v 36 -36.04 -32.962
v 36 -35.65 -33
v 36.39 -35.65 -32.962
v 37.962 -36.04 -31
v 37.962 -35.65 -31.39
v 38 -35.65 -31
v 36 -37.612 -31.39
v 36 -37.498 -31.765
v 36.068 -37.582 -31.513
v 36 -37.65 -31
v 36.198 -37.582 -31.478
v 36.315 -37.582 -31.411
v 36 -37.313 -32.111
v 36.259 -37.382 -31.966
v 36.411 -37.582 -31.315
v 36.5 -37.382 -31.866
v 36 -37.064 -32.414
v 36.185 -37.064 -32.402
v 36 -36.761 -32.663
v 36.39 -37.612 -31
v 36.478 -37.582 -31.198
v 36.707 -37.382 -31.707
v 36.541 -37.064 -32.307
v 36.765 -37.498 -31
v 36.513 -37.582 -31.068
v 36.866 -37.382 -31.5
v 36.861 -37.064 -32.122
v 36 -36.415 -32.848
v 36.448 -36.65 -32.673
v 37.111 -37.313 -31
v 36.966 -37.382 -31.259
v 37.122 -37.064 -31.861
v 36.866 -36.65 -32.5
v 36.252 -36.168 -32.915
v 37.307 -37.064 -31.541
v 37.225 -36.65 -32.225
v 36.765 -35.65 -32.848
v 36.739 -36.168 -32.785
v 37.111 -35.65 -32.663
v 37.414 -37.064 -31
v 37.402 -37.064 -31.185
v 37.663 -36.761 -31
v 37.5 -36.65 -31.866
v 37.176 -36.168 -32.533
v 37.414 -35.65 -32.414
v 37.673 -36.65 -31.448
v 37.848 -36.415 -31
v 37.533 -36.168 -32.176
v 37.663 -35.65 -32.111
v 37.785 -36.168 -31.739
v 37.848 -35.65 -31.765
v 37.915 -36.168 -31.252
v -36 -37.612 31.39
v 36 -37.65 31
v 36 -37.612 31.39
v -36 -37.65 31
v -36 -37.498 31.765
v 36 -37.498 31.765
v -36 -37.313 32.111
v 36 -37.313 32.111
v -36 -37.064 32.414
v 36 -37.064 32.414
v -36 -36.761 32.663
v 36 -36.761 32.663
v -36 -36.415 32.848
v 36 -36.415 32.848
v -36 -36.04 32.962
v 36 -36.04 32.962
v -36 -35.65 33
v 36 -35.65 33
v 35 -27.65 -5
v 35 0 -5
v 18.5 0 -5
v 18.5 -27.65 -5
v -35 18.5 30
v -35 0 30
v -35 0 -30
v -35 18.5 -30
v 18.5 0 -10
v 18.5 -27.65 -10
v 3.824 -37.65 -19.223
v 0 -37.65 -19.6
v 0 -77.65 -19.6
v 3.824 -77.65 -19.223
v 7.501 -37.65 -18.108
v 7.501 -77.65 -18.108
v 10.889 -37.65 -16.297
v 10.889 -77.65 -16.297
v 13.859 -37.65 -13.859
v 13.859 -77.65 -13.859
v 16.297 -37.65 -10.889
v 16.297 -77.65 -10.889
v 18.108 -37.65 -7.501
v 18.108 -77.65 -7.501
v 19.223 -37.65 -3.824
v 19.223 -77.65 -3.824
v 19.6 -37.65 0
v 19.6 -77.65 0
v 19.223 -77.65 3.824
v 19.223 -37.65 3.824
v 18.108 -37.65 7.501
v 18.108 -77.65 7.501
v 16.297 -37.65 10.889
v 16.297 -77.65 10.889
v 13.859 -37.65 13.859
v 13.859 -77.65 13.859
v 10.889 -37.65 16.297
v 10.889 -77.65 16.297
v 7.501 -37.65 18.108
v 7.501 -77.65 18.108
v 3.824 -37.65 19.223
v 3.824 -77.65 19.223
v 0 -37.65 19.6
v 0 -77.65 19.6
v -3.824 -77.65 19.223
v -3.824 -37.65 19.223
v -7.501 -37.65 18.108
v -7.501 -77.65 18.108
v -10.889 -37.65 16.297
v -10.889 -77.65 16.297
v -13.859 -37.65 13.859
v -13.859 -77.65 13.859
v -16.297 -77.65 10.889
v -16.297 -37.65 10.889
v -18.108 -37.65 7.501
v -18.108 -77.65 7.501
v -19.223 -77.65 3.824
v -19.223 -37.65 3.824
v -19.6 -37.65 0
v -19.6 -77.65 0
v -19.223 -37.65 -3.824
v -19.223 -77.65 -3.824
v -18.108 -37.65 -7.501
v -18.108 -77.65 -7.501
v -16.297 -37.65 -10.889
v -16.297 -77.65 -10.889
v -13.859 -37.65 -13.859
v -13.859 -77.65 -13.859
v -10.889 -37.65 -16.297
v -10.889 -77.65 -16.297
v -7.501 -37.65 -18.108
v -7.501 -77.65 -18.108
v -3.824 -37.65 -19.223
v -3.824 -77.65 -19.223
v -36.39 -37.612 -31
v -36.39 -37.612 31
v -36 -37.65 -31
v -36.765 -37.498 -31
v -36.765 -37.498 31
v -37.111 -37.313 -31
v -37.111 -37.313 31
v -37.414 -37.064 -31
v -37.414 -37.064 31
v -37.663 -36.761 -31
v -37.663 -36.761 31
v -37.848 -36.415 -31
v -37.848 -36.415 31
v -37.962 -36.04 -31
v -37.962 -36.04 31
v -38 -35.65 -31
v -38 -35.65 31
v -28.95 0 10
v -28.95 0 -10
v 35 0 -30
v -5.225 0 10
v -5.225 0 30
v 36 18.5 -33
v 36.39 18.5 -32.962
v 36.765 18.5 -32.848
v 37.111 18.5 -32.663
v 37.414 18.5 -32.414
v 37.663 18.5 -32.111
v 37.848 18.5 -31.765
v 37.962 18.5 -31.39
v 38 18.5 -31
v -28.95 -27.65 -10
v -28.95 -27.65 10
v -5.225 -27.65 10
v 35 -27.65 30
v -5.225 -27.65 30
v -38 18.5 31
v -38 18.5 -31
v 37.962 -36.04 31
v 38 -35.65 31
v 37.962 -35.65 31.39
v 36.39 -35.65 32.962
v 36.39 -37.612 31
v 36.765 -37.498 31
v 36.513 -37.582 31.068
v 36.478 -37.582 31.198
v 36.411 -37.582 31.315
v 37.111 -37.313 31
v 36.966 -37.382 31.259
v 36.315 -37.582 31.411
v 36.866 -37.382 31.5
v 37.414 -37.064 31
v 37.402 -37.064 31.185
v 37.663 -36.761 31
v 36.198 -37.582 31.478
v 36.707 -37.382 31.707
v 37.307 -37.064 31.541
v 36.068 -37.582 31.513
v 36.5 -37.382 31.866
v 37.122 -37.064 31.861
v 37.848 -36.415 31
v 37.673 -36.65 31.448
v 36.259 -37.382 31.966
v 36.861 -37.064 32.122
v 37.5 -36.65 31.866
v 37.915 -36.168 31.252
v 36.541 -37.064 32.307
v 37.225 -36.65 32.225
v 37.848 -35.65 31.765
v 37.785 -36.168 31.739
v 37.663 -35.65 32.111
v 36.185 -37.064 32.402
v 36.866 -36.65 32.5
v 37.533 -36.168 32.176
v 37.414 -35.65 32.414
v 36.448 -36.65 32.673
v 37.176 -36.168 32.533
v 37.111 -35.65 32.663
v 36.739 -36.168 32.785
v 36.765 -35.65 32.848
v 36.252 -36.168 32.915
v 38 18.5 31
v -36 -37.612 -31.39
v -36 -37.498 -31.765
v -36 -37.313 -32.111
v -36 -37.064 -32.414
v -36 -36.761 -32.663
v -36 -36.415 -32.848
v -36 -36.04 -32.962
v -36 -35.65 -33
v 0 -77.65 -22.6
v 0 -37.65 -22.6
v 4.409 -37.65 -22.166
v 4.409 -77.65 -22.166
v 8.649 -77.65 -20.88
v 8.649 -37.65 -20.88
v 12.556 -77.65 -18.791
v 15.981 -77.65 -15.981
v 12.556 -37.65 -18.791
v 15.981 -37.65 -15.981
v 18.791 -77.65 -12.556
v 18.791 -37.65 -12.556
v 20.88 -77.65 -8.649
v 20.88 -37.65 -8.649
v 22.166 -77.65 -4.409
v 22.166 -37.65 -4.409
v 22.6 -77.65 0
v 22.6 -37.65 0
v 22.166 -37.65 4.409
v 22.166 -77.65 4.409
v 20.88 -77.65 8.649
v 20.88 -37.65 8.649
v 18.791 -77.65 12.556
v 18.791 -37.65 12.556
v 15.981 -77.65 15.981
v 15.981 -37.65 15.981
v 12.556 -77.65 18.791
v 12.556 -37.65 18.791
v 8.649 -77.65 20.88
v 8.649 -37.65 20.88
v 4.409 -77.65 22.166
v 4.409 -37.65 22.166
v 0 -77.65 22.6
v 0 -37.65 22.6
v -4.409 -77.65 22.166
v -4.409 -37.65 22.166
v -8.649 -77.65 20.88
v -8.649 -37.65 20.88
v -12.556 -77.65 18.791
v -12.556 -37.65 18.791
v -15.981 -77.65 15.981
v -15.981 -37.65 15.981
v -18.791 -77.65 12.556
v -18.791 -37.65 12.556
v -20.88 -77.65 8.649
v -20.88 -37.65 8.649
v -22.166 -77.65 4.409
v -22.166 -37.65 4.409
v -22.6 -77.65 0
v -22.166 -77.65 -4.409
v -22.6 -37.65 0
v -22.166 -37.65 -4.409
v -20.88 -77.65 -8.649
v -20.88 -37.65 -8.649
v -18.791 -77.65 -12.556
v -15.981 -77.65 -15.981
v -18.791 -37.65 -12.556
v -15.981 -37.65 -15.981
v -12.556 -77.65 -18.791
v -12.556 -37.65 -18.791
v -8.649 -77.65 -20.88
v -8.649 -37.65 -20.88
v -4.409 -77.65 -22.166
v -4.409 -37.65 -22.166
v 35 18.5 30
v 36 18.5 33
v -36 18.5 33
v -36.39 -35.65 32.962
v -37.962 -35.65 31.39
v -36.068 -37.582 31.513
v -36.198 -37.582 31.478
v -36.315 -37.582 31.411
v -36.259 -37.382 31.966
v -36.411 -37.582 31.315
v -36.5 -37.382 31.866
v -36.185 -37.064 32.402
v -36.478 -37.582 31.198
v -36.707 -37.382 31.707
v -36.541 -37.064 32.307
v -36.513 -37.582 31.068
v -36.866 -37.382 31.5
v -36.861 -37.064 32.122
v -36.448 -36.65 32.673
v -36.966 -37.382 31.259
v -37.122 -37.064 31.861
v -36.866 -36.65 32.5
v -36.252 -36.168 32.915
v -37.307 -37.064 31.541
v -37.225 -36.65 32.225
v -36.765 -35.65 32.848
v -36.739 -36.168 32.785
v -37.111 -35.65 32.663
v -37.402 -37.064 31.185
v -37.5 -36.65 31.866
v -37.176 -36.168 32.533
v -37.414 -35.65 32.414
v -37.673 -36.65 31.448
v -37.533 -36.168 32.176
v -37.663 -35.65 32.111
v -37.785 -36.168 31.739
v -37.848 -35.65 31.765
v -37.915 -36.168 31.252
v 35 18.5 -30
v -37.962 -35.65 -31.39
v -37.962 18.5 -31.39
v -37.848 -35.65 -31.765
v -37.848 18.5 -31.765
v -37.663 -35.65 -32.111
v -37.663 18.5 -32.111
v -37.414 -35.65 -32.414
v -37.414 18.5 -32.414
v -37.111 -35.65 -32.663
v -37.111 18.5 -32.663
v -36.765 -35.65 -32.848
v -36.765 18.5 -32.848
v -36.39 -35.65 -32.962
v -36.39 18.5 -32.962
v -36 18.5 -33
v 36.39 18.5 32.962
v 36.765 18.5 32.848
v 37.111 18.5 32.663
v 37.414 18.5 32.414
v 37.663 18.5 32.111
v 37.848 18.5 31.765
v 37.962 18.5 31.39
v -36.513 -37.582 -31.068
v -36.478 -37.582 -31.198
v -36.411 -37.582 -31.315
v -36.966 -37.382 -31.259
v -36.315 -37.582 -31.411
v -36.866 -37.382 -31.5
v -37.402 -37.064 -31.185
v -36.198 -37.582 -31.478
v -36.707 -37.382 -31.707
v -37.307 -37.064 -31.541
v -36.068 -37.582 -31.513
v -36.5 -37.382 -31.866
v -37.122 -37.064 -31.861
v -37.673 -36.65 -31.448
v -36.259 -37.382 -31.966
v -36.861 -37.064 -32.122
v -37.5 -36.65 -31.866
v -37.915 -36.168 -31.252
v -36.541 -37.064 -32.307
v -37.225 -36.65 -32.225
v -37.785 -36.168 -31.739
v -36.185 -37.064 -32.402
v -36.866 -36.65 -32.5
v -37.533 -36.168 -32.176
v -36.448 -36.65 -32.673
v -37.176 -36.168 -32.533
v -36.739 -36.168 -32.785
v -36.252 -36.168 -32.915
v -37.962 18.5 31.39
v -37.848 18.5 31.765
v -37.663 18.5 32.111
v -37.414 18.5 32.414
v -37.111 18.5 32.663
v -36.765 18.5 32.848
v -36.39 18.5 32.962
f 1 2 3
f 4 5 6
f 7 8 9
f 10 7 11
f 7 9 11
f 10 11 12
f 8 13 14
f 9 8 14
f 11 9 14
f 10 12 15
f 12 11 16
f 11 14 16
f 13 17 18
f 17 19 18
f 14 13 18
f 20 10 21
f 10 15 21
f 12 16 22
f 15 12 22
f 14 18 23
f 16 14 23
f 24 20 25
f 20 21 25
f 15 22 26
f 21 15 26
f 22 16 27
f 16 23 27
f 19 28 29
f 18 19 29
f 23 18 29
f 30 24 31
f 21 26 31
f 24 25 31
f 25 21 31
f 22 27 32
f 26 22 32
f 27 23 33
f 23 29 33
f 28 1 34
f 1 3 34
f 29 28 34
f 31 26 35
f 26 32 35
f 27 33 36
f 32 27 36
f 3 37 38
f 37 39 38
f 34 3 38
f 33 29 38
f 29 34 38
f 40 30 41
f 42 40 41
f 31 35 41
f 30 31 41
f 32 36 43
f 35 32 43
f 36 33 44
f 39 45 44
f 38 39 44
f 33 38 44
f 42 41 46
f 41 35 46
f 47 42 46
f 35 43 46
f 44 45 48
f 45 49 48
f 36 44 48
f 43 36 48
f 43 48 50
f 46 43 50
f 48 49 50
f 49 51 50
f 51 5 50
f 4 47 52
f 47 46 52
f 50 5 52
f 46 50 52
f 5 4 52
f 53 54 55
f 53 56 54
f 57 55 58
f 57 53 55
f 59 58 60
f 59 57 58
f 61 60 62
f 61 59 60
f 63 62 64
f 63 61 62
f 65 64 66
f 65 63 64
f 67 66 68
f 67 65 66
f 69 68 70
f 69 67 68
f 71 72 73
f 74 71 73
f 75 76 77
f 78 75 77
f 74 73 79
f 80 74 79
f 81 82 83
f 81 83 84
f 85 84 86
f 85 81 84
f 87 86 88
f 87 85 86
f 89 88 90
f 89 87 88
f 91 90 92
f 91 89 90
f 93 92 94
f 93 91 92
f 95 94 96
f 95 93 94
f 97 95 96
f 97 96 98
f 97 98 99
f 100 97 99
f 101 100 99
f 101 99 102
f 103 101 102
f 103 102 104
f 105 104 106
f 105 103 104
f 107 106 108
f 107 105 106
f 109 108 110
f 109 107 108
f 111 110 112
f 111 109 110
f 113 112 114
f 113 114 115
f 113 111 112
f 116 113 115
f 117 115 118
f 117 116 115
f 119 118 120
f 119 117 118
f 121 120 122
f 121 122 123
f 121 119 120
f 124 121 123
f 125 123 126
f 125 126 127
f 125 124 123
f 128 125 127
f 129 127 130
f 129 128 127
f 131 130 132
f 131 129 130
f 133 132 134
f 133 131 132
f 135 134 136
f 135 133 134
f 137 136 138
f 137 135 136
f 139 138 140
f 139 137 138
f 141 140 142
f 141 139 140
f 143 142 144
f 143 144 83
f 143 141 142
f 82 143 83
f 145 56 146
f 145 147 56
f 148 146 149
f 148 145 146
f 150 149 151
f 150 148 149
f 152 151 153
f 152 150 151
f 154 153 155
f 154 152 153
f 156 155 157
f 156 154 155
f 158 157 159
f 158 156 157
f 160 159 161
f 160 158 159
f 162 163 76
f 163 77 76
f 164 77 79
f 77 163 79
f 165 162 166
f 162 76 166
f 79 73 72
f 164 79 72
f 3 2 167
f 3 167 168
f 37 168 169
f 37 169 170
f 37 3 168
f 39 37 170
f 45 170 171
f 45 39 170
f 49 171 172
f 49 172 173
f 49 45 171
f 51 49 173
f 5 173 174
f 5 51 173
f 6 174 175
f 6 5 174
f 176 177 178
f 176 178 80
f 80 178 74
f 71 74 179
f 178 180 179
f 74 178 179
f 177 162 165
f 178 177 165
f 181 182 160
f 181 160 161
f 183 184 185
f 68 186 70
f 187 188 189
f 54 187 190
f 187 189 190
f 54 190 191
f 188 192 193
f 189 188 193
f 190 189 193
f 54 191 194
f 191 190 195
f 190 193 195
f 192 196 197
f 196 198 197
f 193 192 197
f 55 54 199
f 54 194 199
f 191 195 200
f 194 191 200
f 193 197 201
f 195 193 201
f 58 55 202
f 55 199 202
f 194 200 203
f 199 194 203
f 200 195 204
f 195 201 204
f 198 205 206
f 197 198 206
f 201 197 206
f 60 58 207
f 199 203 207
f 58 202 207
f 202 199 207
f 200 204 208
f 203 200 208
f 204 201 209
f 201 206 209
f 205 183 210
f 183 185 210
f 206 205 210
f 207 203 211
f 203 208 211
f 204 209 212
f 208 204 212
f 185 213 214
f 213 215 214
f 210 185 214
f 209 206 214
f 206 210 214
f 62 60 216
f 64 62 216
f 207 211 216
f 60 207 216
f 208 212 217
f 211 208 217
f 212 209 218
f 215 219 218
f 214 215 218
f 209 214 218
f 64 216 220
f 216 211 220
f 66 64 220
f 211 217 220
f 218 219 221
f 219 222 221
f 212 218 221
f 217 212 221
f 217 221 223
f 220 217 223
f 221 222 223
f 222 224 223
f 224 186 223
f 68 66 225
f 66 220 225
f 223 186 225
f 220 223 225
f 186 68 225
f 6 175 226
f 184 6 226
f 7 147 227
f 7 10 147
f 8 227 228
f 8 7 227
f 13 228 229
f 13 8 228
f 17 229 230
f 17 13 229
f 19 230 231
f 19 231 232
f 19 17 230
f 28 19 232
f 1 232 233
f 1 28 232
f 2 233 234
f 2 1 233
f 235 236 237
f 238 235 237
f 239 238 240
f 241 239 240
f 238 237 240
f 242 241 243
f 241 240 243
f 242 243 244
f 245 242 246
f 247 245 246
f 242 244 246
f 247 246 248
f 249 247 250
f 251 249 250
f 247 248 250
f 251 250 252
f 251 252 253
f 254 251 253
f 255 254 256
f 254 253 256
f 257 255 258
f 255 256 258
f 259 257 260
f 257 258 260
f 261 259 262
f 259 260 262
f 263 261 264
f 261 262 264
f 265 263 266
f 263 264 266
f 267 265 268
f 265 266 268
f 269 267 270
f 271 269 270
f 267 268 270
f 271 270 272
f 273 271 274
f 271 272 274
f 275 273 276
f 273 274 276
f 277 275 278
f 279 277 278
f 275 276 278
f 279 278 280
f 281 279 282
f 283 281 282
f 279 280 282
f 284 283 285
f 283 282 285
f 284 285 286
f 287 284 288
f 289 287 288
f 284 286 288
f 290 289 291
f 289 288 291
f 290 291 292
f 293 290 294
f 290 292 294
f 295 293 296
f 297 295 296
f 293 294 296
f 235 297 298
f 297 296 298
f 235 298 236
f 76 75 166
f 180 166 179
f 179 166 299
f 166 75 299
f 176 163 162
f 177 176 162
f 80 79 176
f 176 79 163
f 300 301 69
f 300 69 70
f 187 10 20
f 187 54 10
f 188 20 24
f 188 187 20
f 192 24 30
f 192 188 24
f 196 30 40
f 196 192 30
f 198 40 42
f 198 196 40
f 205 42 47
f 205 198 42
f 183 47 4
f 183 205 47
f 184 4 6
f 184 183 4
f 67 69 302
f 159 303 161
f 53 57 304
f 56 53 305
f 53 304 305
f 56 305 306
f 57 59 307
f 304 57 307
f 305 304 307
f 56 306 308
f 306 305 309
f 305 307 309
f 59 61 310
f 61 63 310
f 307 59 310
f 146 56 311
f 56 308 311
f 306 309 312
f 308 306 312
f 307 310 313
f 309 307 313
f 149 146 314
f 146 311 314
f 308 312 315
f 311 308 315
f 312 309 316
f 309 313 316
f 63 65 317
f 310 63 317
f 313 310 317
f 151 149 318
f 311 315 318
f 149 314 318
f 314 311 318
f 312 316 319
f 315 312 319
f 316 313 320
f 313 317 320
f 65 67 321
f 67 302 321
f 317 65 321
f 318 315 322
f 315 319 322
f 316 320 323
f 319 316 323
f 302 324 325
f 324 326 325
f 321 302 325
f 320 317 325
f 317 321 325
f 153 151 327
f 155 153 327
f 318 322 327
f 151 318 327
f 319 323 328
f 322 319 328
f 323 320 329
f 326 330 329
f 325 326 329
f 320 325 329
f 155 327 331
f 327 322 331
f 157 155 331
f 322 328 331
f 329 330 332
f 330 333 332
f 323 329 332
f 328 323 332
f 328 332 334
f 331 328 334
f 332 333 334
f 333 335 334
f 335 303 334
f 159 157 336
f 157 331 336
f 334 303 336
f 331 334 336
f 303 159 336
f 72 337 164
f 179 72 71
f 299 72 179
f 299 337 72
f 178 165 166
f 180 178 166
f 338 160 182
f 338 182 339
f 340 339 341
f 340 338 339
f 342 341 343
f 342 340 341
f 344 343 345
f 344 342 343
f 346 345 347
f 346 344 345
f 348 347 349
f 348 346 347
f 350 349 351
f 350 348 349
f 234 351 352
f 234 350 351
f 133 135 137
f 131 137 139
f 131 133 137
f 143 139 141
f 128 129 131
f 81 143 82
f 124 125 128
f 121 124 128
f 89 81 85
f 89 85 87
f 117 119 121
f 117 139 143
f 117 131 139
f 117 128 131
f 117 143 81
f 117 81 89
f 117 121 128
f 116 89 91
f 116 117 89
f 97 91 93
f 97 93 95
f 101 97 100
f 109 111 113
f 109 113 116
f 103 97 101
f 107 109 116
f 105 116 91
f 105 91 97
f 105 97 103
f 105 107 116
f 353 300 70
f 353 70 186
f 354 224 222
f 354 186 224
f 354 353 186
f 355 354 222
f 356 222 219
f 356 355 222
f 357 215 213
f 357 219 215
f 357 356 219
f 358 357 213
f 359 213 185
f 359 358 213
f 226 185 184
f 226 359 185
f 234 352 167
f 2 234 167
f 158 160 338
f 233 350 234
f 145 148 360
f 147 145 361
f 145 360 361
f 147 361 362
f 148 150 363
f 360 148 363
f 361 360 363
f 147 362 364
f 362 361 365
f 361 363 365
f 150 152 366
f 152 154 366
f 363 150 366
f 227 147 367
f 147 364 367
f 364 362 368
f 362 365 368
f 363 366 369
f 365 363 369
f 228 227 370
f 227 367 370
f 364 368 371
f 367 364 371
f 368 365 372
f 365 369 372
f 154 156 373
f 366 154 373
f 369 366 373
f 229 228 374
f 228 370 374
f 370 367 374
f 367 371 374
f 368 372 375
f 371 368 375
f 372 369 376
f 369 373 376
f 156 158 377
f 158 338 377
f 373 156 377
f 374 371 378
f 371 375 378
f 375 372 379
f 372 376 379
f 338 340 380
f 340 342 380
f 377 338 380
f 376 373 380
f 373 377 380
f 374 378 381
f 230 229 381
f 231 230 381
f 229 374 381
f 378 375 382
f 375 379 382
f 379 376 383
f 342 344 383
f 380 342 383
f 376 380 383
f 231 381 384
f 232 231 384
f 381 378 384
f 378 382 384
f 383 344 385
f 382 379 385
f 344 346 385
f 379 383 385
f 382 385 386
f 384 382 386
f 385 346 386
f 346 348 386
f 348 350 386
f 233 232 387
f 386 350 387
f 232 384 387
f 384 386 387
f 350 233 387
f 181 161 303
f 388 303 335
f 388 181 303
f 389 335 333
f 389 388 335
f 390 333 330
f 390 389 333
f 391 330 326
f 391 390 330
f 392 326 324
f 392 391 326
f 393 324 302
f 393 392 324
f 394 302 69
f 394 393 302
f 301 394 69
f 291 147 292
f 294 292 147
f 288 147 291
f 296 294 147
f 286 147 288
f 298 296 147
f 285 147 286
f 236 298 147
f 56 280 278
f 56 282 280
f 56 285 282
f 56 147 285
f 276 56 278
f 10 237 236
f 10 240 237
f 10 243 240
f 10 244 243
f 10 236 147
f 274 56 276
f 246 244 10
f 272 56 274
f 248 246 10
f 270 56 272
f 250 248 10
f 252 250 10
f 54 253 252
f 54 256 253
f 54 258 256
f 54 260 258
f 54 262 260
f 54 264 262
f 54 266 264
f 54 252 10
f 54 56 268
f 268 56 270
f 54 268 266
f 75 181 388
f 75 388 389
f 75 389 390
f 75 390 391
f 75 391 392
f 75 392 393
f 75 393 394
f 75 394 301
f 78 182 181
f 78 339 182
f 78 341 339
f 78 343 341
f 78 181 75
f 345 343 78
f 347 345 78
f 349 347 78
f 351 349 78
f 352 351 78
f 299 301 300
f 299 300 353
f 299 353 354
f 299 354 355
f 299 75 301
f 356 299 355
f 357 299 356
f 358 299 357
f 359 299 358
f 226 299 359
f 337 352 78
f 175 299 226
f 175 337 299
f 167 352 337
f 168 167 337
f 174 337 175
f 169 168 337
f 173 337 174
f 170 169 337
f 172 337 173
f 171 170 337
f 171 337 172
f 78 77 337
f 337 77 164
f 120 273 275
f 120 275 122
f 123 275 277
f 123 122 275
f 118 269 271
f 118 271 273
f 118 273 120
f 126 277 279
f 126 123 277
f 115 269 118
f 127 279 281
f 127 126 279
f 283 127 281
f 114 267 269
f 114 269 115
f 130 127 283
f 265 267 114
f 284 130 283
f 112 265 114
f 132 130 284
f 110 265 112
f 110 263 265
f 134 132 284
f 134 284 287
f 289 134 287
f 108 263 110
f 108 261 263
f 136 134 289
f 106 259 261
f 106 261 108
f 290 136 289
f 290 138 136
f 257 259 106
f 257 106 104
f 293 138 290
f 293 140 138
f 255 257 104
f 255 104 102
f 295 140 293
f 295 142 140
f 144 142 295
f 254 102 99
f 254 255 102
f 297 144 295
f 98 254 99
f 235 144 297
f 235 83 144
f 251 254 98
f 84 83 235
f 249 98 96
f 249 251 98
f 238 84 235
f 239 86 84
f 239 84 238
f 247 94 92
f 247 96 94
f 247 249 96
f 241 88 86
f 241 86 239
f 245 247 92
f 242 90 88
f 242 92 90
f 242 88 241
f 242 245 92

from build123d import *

# Parameters (mm, degrees)
SKETCH1_W           = 76
SKETCH1_H           = 66
SKETCH1_W_2         = 70
SKETCH1_H_2         = 60
BOSS_EXTRUDE1_DEPTH = 18.5
SKETCH2_W           = 76
SKETCH2_H           = 66
SKETCH2_W_2         = 70
SKETCH2_H_2         = 60
BOSS_EXTRUDE2_DEPTH = 27.65
SKETCH4_W           = 76
SKETCH4_H           = 66
BOSS_EXTRUDE3_DEPTH = 10
SKETCH5_R           = 22.6
SKETCH5_R_2         = 19.6
BOSS_EXTRUDE4_DEPTH = 40
FILLET1_R           = 2
FILLET2_R           = 2


with BuildPart() as part:
    # Sketch1 → Boss-Extrude1 (new body)
    with BuildSketch(Plane(origin=(0, 0, 0), x_dir=(1, 0, 0), z_dir=(0, 1, 0))):
        Rectangle(SKETCH1_W, SKETCH1_H)
        Rectangle(SKETCH1_W_2, SKETCH1_H_2, mode=Mode.SUBTRACT)
    extrude(amount=BOSS_EXTRUDE1_DEPTH)

    # Sketch2 → Boss-Extrude2 (add)
    # profile 1 of 2: a face of its own
    with BuildSketch(Plane.XZ):
        Rectangle(SKETCH2_W, SKETCH2_H)
        Rectangle(SKETCH2_W_2, SKETCH2_H_2, mode=Mode.SUBTRACT)
    # profile 2 of 2: a face of its own
    with BuildSketch(Plane.XZ):
        Polygon((-28.95, 10), (-5.225, 10), (-5.225, 30), (-35, 30), (-35, -30), (35, -30), (35, -5), (18.5, -5), (18.5, -10), (-28.95, -10), align=None)
    extrude(amount=BOSS_EXTRUDE2_DEPTH)

    # Sketch4 → Boss-Extrude3 (add)
    with BuildSketch(Plane.XZ.offset(27.65)):
        Rectangle(SKETCH4_W, SKETCH4_H)
    extrude(amount=BOSS_EXTRUDE3_DEPTH)

    # Sketch5 → Boss-Extrude4 (add)
    with BuildSketch(Plane.XZ.offset(37.65)):
        with Locations(Location((0, 0, 0), (0, 0, 270))):
            Circle(SKETCH5_R)
        with Locations(Location((0, 0, 0), (0, 0, 270))):
            Circle(SKETCH5_R_2, mode=Mode.SUBTRACT)
    extrude(amount=BOSS_EXTRUDE4_DEPTH)

    # Fillet1
    fillet1_edges = [part.edges().sort_by_distance(p)[0] for p in [
        (38, -9.575, 33),
        (-38, -9.575, 33),
        (-38, -9.575, -33),
        (38, -9.575, -33),
    ]]
    fillet(fillet1_edges, radius=FILLET1_R)

    # Fillet2
    fillet2_edges = [part.edges().sort_by_distance(p)[0] for p in [
        (0, -37.65, -33),
        (38, -37.65, 0),
        (0, -37.65, 33),
        (-38, -37.65, 0),
        (-37.414213562, -37.65, 32.414213562),
        (37.414213562, -37.65, 32.414213562),
        (-37.414213562, -37.65, -32.414213562),
        (37.414213562, -37.65, -32.414213562),
    ]]
    fillet(fillet2_edges, radius=FILLET2_R)


solid = part.part
